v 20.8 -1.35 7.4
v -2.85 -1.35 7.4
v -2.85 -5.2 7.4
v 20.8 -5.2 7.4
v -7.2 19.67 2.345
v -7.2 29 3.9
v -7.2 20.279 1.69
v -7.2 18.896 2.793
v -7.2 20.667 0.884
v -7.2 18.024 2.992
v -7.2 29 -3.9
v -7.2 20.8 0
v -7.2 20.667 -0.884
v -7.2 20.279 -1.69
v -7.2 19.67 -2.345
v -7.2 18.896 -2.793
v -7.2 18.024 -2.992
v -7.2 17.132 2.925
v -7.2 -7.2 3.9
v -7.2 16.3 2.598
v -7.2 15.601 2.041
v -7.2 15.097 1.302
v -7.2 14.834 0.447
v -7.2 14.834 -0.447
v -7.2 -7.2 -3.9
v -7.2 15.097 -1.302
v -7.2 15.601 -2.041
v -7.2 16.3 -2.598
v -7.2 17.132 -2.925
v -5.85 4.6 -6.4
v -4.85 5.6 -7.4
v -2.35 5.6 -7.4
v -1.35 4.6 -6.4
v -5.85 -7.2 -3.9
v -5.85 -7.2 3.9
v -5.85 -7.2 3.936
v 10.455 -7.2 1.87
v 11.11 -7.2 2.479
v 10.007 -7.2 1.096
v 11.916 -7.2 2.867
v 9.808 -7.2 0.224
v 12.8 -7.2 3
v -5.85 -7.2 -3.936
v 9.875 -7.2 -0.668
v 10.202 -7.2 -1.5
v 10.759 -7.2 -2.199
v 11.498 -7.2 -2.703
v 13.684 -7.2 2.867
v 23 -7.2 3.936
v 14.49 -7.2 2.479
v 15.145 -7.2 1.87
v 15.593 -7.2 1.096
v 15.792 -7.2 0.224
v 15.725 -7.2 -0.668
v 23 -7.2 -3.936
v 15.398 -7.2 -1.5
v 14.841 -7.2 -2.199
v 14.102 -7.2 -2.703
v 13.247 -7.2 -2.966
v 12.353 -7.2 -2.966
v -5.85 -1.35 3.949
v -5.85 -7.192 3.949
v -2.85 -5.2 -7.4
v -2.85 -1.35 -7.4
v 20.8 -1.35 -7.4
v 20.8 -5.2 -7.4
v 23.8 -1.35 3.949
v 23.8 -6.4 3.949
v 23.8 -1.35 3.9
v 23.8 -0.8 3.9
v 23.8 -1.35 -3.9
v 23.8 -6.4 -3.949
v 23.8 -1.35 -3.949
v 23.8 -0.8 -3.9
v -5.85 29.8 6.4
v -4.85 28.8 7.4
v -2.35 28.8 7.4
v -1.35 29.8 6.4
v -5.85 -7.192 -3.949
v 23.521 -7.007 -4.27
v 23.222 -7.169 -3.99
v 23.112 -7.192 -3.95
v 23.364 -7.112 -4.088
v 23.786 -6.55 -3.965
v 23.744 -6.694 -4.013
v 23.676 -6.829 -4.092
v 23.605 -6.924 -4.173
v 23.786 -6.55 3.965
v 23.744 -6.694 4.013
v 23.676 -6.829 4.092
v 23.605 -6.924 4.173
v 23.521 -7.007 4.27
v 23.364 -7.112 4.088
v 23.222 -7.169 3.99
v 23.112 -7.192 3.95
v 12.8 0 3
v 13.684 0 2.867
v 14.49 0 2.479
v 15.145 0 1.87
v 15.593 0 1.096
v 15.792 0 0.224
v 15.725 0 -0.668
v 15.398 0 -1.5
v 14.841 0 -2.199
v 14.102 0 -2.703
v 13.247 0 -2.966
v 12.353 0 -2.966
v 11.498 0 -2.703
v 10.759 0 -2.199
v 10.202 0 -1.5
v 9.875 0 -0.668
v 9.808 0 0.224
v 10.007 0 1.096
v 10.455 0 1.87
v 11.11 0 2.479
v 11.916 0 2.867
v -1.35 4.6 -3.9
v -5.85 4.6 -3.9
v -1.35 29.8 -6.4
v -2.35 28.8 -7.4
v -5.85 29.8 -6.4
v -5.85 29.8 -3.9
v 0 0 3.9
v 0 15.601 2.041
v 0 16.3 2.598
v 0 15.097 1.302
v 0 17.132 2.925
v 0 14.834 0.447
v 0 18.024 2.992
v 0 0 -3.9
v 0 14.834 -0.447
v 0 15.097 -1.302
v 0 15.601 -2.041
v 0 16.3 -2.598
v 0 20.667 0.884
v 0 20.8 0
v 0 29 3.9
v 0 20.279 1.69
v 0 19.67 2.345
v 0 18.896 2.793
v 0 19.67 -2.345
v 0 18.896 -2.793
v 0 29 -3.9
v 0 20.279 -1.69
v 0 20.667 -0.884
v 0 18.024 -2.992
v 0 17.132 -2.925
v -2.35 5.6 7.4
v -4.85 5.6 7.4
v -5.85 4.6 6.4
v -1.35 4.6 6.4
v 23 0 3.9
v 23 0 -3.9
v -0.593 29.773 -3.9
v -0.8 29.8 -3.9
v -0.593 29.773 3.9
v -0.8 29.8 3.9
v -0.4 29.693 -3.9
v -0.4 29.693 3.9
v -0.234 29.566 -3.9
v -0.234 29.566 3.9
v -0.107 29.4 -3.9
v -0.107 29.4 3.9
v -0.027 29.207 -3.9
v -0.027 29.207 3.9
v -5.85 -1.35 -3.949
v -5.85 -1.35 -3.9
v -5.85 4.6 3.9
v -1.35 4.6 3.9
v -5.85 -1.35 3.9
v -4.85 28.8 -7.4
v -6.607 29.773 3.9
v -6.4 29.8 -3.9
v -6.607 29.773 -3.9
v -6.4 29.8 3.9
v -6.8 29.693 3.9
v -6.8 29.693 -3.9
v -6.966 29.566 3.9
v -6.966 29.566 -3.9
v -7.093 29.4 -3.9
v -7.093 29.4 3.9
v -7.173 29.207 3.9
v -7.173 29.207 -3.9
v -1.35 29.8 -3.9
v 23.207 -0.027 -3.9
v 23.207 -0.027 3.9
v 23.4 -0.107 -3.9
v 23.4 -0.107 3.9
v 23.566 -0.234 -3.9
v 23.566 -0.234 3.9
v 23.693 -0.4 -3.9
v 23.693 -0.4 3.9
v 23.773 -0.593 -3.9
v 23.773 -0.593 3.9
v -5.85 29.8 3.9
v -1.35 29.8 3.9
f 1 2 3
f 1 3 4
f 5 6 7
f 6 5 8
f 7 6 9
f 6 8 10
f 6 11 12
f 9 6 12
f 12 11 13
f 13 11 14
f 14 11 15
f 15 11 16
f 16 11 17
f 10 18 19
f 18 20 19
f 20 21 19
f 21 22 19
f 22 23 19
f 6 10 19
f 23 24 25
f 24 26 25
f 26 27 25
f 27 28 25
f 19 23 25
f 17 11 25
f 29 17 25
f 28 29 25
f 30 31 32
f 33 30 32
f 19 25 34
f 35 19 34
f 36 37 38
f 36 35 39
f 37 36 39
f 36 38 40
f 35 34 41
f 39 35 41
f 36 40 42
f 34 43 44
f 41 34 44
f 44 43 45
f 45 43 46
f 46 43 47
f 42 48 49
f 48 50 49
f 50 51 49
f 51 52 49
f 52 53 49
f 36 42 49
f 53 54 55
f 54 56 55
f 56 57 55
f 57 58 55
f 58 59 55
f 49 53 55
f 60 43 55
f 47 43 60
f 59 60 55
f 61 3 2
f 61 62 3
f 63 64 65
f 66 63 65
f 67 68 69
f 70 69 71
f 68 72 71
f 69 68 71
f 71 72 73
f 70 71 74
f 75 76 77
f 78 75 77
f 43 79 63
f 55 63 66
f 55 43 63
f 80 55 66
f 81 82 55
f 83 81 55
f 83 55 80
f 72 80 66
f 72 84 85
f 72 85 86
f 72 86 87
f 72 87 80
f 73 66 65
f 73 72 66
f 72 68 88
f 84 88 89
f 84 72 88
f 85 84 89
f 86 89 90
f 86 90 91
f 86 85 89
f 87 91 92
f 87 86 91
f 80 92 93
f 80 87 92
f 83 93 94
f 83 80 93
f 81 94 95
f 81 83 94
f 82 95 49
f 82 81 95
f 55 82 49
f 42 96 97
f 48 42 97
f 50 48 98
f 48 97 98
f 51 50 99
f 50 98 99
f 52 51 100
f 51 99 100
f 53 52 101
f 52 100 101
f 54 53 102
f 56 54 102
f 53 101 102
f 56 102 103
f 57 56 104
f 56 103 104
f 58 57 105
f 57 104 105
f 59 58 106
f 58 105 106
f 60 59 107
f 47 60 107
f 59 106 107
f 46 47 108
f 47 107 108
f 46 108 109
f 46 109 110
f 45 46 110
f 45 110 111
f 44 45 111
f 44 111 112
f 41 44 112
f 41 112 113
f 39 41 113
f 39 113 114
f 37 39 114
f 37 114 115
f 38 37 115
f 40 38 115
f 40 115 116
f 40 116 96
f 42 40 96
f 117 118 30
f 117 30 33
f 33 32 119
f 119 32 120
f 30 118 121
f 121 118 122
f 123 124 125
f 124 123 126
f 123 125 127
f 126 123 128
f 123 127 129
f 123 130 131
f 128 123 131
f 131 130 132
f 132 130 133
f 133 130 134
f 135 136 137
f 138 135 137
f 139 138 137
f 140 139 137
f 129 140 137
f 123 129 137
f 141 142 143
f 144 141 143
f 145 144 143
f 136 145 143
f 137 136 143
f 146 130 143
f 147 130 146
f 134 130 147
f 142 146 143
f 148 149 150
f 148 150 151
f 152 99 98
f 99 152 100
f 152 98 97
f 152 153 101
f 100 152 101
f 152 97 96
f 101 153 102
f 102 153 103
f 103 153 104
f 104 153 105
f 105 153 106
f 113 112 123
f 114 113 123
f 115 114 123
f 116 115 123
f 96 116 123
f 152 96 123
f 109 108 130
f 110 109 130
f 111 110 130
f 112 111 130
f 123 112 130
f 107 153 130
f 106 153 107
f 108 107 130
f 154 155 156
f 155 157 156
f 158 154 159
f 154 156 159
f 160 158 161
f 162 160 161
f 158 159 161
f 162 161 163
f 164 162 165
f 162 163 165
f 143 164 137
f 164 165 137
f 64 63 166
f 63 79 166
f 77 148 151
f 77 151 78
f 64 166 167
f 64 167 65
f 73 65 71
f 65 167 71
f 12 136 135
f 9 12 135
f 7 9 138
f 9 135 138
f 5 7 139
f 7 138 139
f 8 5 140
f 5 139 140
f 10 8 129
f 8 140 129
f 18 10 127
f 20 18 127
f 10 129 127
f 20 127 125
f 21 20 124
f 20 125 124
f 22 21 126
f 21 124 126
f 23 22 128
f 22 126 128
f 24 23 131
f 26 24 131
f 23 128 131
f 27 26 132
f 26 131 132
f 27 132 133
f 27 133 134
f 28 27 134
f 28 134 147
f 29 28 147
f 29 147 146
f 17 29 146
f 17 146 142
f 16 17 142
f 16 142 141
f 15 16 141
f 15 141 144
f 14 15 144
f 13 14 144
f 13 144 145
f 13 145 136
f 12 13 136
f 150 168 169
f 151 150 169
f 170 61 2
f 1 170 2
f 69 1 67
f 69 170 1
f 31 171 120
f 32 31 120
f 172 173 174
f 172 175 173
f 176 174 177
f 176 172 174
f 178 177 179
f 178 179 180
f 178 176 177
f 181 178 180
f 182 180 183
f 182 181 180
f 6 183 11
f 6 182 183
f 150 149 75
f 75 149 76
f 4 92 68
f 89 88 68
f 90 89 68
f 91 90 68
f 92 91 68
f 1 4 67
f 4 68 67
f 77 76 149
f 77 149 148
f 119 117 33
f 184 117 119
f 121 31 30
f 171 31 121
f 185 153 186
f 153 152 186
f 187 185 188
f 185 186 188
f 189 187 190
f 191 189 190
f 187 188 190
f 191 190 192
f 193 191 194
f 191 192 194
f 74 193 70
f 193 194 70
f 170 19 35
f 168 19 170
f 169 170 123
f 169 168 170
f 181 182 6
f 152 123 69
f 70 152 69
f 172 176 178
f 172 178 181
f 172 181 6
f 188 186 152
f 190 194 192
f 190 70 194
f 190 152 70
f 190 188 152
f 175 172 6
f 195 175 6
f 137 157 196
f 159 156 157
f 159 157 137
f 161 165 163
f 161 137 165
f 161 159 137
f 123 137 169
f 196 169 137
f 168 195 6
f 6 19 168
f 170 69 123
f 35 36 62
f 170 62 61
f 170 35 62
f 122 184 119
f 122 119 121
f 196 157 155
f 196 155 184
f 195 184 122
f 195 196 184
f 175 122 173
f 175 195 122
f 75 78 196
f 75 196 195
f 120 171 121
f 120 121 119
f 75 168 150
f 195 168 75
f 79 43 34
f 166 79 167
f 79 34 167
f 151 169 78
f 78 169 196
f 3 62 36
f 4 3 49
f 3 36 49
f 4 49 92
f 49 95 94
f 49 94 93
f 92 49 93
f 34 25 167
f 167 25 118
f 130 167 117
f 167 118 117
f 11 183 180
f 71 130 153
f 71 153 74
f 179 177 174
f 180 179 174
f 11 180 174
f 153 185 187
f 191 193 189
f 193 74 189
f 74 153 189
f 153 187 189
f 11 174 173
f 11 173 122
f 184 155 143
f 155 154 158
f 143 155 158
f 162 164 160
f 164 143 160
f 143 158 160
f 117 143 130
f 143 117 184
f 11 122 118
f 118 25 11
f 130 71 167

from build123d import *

# Parameters (mm, degrees)
EXTRUDE1_DEPTH      = 3.9
EXTRUDE1_DEPTH_BACK = 3.9
SKETCH2_W           = 4.5
SKETCH2_H           = 25.2
SKETCH2_W_2         = 29.65
SKETCH2_H_2         = 5.85
EXTRUDE2_DEPTH      = 3.5
CHAMFER1_SIZE       = 3
CHAMFER1_SIZE2      = 3.451105222
CHAMFER2_SIZE       = 2
CHAMFER2_SIZE2      = 3.464101615
CHAMFER3_SIZE       = 1
EXTRUDE3_REACH      = 40.849
SKETCH4_R           = 3
FILLET1_R           = 0.8
EXTRUDE4_REACH      = 40.849
SKETCH5_R           = 3


# Read off the part's stored shape, not the designer's step: Mirror1
with BuildPart() as part:
    # Sketch1 → Extrude1 (new, two sides: drawn at the far end of the back side and taken through both)
    with BuildSketch(Plane.XY.offset(-EXTRUDE1_DEPTH_BACK)):
        Polygon((0, 0), (0, 29.8), (-7.2, 29.8), (-7.2, -7.2), (23.8, -7.2), (23.8, 0), align=None)
    extrude(amount=EXTRUDE1_DEPTH + EXTRUDE1_DEPTH_BACK)

    # Sketch2 → Extrude2 (add)
    with BuildSketch(Plane.XY.offset(3.9)):
        with Locations((-3.6, 17.2)):
            Rectangle(SKETCH2_W, SKETCH2_H)
        with Locations((8.975, -4.275)):
            Rectangle(SKETCH2_W_2, SKETCH2_H_2)
    extrude(amount=EXTRUDE2_DEPTH)

    # Chamfer1
    chamfer1_edges = [part.edges().sort_by_distance(p)[0] for p in [
        (23.8, -4.275, 7.4),
        (-5.85, -4.275, 7.4),
    ]]
    chamfer1_side = [part.faces().sort_by_distance(p)[0] for p in [
        (8.975, -4.275, 7.4),
    ]]
    chamfer(chamfer1_edges, length=CHAMFER1_SIZE, length2=CHAMFER1_SIZE2, reference=chamfer1_side[0])

    # Chamfer2
    chamfer2_edges = [part.edges().sort_by_distance(p)[0] for p in [
        (8.975, -7.2, 7.4),
    ]]
    chamfer2_side = [part.faces().sort_by_distance(p)[0] for p in [
        (8.975, -4.275, 7.4),
    ]]
    chamfer(chamfer2_edges, length=CHAMFER2_SIZE, length2=CHAMFER2_SIZE2, reference=chamfer2_side[0])

    # Chamfer3
    chamfer3_edges = [part.edges().sort_by_distance(p)[0] for p in [
        (-3.6, 29.8, 7.4),
        (-1.35, 17.2, 7.4),
        (-3.6, 4.6, 7.4),
        (-5.85, 17.2, 7.4),
    ]]
    chamfer(chamfer3_edges, length=CHAMFER3_SIZE)

    # Mirror1: part across plane


with BuildPart() as part_1:
    add(part.part)
    add(part.part.mirror(Plane.XY))

    # Sketch4 → Extrude3 (cut, up to next)
    with BuildSketch(Plane(origin=(0, 0, 0), x_dir=(1, 0, 0), z_dir=(0, 1, 0)), mode=Mode.PRIVATE) as extrude3_sk1:
        with Locations(Location((12.8, 0, 0), (0, 0, 270))):
            Circle(SKETCH4_R)
    extrude3_tool1 = extrude(extrude3_sk1.sketch, amount=-EXTRUDE3_REACH, mode=Mode.PRIVATE) & part_1.part
    add(extrude3_tool1.solids().sort_by_distance((12.8, 0, 0))[0], mode=Mode.SUBTRACT)

    # Fillet1
    fillet1_edges = [part_1.edges().sort_by_distance(p)[0] for p in [
        (-7.2, 29.8, 0),
        (23.8, -7.2, 0),
        (23.8, 0, 0),
        (0, 29.8, 0),
    ]]
    fillet(fillet1_edges, radius=FILLET1_R)

    # Sketch5 → Extrude4 (cut, up to next)
    with BuildSketch(Plane(origin=(0, 0, 0), x_dir=(0, 0, -1), z_dir=(1, 0, 0)), mode=Mode.PRIVATE) as extrude4_sk1:
        with Locations(Location((0, 17.8, 0), (0, 0, 90))):
            Circle(SKETCH5_R)
    extrude4_tool1 = extrude(extrude4_sk1.sketch, amount=-EXTRUDE4_REACH, mode=Mode.PRIVATE) & part_1.part
    add(extrude4_tool1.solids().sort_by_distance((0, 17.8, 0))[0], mode=Mode.SUBTRACT)


solid = part_1.part
